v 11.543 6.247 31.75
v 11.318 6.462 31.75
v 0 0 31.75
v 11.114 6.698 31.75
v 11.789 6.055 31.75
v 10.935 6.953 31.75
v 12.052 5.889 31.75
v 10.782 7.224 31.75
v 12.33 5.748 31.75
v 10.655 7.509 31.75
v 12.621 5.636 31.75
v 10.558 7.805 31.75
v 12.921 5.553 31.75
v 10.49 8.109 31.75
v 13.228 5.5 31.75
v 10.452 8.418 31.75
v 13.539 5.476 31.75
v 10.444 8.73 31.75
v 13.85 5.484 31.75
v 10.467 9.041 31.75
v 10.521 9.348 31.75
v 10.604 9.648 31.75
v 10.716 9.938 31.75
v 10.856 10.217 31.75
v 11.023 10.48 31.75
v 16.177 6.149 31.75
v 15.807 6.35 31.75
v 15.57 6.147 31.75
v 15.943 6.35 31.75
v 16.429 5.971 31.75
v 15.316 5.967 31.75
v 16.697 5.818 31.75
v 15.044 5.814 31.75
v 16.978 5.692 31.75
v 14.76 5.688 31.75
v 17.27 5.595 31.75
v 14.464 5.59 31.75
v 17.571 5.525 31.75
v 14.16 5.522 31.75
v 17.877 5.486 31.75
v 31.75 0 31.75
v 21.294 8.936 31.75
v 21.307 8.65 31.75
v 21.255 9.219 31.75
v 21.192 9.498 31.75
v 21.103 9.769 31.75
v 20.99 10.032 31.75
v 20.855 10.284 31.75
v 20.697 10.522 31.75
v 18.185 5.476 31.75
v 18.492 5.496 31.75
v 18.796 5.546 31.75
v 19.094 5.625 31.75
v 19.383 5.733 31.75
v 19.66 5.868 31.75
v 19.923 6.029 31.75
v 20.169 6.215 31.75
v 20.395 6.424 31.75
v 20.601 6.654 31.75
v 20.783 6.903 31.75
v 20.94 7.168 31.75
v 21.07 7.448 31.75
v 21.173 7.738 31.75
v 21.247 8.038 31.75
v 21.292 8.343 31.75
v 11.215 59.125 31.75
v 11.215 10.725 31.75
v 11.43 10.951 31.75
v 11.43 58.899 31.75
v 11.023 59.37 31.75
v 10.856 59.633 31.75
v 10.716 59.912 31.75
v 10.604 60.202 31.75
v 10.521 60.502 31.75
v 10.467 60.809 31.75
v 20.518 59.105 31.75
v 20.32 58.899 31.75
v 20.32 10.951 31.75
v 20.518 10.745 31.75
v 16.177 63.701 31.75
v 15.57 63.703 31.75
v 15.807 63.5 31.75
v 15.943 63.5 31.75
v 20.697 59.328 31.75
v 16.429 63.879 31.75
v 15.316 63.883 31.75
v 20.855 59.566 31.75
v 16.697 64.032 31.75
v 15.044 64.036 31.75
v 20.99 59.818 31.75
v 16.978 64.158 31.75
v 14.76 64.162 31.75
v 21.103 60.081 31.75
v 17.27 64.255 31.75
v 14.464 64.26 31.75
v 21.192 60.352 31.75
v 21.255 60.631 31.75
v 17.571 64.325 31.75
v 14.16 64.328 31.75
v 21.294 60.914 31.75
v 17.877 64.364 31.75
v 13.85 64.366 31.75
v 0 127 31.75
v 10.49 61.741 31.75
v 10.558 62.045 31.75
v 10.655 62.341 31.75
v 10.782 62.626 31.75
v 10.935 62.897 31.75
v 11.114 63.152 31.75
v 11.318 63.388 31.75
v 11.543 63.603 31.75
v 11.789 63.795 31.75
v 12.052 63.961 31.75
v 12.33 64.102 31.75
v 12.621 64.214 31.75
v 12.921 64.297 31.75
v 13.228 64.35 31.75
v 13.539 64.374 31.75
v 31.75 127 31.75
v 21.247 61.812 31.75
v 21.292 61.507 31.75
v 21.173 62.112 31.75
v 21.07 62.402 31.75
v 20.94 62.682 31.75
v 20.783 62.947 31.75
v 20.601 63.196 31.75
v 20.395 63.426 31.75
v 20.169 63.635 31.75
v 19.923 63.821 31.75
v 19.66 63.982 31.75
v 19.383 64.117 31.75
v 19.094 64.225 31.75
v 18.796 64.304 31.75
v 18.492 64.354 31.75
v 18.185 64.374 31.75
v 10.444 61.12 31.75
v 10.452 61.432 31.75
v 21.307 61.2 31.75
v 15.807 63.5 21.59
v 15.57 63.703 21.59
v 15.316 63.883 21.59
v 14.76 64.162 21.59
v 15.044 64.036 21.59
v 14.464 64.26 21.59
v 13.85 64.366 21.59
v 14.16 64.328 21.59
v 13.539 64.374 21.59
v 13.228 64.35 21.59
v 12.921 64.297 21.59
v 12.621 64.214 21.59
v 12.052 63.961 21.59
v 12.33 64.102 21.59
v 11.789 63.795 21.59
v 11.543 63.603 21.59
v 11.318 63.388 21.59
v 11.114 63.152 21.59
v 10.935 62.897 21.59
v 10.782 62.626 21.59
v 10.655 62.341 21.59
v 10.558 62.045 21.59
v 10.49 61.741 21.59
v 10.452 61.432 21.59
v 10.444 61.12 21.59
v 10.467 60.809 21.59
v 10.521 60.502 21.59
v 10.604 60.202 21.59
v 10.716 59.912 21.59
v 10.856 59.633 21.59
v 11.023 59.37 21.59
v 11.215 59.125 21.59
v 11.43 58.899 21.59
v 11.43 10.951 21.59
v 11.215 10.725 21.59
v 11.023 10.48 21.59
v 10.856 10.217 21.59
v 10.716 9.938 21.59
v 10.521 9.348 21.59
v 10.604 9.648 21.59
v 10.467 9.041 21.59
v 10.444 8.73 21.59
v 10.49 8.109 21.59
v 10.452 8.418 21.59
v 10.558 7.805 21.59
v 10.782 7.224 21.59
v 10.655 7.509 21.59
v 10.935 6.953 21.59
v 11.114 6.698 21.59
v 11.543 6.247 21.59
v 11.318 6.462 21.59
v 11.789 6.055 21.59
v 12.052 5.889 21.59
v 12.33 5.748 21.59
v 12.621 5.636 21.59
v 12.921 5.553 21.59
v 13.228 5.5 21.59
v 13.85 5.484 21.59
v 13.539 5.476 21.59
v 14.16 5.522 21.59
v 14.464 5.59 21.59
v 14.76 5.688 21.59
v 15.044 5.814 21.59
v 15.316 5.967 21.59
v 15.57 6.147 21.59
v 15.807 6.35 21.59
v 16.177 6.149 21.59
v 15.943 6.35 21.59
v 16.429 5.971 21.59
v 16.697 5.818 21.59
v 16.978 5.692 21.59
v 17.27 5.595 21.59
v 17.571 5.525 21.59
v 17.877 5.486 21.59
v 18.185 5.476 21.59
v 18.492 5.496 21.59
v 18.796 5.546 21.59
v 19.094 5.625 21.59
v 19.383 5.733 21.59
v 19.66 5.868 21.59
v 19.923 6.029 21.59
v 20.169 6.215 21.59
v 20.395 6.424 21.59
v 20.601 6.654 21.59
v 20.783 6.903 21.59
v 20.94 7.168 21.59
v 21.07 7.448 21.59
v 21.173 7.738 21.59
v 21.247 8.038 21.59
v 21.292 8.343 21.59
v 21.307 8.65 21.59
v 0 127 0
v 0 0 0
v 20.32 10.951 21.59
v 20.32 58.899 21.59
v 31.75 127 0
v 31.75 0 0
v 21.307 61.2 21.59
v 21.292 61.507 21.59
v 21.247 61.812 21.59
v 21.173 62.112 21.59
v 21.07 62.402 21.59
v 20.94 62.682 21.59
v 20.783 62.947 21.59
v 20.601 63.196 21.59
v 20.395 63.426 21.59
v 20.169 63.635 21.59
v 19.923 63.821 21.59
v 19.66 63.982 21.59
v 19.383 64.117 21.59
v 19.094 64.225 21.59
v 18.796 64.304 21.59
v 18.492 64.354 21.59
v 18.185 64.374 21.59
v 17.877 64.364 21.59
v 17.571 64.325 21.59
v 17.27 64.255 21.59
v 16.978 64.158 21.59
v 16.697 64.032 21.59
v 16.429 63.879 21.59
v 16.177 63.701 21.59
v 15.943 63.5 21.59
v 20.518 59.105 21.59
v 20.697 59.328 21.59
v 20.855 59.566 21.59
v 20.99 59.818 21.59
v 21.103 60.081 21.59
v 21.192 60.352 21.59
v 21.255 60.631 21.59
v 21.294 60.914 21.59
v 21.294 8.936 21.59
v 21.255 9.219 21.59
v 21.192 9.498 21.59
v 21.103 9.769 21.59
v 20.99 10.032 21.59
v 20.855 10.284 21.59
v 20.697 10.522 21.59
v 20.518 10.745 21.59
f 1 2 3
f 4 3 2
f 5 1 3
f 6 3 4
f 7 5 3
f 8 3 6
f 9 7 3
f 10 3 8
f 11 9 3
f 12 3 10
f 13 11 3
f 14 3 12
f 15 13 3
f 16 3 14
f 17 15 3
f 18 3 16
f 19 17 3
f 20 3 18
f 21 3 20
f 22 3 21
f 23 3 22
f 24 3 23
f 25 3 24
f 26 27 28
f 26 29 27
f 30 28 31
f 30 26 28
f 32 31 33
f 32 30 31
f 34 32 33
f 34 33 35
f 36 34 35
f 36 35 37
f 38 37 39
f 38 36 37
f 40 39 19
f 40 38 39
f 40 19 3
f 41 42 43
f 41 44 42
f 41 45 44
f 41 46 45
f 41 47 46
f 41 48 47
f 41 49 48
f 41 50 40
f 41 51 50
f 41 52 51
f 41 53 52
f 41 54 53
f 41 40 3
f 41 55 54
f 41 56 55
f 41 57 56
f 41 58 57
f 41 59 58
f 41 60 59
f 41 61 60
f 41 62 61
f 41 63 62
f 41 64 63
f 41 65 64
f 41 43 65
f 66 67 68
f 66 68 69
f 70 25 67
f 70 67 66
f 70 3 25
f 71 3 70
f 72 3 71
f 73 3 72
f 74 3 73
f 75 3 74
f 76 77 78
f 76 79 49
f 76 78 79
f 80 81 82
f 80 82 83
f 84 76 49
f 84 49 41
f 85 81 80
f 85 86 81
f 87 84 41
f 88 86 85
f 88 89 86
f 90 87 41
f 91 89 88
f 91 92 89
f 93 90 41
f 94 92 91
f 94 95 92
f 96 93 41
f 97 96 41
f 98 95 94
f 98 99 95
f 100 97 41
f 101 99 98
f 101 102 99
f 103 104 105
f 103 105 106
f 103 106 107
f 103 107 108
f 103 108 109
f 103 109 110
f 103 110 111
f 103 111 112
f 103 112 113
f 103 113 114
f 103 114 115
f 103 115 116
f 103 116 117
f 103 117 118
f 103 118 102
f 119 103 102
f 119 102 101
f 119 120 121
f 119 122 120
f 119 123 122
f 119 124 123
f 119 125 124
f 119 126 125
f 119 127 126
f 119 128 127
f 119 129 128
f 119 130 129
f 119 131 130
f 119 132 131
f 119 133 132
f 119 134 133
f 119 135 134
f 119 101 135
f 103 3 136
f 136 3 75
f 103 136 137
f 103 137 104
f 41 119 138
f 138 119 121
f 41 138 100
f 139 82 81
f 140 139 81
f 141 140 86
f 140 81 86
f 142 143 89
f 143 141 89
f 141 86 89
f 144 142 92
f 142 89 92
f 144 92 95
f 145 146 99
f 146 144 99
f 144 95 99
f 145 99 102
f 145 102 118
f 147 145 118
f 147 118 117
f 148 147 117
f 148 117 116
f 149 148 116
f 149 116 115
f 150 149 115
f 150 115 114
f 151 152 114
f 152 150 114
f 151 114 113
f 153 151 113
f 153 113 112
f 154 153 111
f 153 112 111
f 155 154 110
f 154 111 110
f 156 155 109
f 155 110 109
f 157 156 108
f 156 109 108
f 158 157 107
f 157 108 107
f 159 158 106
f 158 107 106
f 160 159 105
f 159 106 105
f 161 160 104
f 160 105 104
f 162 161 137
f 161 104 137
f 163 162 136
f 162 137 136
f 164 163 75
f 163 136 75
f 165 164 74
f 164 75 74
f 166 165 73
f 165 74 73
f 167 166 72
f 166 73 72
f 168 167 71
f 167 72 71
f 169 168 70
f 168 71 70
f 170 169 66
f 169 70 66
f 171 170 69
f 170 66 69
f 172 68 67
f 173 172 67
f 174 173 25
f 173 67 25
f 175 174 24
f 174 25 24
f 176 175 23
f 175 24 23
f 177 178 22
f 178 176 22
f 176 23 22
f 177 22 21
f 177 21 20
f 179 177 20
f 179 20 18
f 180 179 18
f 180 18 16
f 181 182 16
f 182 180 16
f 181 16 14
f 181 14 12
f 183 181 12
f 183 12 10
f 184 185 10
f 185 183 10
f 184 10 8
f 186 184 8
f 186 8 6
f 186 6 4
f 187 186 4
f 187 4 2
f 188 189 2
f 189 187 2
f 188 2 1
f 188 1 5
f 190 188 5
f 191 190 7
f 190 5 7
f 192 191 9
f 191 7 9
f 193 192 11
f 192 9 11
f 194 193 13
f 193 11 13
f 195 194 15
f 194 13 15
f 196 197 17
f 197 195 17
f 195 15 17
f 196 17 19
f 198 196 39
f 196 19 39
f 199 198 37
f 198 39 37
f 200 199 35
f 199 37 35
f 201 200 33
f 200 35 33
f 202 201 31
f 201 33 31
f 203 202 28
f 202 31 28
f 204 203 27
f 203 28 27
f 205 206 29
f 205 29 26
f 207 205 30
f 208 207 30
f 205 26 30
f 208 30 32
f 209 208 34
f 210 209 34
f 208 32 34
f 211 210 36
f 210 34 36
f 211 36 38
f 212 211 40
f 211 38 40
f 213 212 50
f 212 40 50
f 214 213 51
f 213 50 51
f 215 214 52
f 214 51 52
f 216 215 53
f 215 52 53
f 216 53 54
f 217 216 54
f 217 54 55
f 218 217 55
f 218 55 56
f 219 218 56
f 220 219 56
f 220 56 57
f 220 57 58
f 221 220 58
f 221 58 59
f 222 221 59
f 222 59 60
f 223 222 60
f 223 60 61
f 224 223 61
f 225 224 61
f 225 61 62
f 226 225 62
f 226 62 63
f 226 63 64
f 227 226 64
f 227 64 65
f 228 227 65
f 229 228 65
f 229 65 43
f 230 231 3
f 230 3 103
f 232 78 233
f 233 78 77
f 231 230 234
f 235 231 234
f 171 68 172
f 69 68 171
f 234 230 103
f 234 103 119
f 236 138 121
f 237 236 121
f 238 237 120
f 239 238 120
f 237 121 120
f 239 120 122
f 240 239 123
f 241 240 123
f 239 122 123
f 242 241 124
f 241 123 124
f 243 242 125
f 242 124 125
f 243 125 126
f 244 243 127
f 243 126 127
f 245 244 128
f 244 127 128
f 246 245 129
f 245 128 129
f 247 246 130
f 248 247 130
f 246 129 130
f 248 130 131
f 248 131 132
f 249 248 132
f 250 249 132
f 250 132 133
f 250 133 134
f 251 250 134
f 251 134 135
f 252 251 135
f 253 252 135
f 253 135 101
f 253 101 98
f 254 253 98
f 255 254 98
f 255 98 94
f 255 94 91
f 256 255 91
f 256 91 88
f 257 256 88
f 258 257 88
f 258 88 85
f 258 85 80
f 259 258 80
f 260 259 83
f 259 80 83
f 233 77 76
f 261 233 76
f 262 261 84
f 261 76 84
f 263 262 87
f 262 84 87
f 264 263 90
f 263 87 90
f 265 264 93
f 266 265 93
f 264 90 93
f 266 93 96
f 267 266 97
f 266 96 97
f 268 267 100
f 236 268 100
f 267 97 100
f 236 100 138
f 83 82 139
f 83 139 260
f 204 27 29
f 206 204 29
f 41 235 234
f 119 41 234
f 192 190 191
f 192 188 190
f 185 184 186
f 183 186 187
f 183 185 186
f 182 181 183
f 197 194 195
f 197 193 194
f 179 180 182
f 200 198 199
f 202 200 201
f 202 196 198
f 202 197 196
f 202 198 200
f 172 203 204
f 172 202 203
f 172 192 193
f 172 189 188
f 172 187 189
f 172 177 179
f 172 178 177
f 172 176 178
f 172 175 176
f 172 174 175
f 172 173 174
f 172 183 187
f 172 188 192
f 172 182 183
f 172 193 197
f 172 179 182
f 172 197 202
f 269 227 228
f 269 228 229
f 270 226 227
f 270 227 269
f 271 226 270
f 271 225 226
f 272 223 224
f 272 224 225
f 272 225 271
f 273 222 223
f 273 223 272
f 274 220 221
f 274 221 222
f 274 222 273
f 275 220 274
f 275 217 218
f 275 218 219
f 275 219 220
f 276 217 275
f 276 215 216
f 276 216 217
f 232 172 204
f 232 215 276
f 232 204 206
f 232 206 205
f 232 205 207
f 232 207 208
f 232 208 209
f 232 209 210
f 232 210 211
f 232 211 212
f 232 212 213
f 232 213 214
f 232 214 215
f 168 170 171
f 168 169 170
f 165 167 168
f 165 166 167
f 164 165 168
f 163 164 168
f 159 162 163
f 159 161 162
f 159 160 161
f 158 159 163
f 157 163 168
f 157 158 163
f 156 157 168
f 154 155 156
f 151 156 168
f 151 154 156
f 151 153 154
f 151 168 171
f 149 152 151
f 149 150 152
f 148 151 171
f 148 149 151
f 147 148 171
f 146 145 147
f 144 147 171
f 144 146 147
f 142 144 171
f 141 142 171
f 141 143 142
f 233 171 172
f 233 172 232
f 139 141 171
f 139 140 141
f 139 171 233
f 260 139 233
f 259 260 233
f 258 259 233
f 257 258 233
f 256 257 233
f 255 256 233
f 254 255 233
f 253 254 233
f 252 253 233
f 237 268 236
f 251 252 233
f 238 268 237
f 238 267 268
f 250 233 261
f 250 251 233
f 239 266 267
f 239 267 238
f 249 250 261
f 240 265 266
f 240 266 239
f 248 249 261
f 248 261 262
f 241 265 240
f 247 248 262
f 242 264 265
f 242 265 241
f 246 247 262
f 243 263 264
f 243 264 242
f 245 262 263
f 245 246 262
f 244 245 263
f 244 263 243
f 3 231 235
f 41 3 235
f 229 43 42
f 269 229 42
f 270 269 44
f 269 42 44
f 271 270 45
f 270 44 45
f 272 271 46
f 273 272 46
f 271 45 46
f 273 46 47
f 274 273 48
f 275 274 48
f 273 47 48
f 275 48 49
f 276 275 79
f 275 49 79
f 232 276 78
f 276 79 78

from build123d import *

# Parameters (mm, degrees)
F0_W     = 31.75
F0_H     = 127
F1_DEPTH = 31.75
F2_W     = 8.89
F2_H     = 57.15
F3_DEPTH = 10.16
F5_DEPTH = 10.16


with BuildPart() as f1:
    # F0 (on Top) → F1 (new body)
    with BuildSketch(Plane.XY):
        with Locations((15.875, 63.5)):
            Rectangle(F0_W, F0_H)
    extrude(amount=F1_DEPTH)

    # F2 (on face) → F3 (cut)
    with BuildSketch(Plane.XY.offset(31.75)):
        with Locations((15.875, 34.925)):
            Rectangle(F2_W, F2_H)
    extrude(amount=-F3_DEPTH, mode=Mode.SUBTRACT)

    # F4 (on face) → F5 (cut, through all)
    with BuildSketch(Plane.XY.offset(31.75)):
        with BuildLine():
            ThreePointArc((15.875, 58.966207), (19.339109, 58.263056), (21.306743, 61.199532))
            ThreePointArc((21.306743, 61.199532), (19.339109, 64.136008), (15.875, 63.432856))
            ThreePointArc((15.875, 63.432856), (16.554733, 62.406898), (16.793257, 61.199532))
            ThreePointArc((16.793257, 61.199532), (16.554733, 59.992165), (15.875, 58.966207))
        make_face()
        with BuildLine():
            ThreePointArc((15.875, 58.966207), (14.956743, 61.199532), (15.875, 63.432856))
            ThreePointArc((15.875, 63.432856), (10.443257, 61.199532), (15.875, 58.966207))
        make_face()
        with BuildLine():
            ThreePointArc((15.875, 6.417144), (19.339109, 5.713992), (21.306743, 8.650468))
            ThreePointArc((21.306743, 8.650468), (19.339109, 11.586944), (15.875, 10.883793))
            ThreePointArc((15.875, 10.883793), (16.554733, 9.857835), (16.793257, 8.650468))
            ThreePointArc((16.793257, 8.650468), (16.554733, 7.443102), (15.875, 6.417144))
        make_face()
        with BuildLine():
            ThreePointArc((15.875, 6.417144), (14.956743, 8.650468), (15.875, 10.883793))
            ThreePointArc((15.875, 10.883793), (10.443257, 8.650468), (15.875, 6.417144))
        make_face()
    extrude(amount=-F5_DEPTH, mode=Mode.SUBTRACT)


solid = f1.part
